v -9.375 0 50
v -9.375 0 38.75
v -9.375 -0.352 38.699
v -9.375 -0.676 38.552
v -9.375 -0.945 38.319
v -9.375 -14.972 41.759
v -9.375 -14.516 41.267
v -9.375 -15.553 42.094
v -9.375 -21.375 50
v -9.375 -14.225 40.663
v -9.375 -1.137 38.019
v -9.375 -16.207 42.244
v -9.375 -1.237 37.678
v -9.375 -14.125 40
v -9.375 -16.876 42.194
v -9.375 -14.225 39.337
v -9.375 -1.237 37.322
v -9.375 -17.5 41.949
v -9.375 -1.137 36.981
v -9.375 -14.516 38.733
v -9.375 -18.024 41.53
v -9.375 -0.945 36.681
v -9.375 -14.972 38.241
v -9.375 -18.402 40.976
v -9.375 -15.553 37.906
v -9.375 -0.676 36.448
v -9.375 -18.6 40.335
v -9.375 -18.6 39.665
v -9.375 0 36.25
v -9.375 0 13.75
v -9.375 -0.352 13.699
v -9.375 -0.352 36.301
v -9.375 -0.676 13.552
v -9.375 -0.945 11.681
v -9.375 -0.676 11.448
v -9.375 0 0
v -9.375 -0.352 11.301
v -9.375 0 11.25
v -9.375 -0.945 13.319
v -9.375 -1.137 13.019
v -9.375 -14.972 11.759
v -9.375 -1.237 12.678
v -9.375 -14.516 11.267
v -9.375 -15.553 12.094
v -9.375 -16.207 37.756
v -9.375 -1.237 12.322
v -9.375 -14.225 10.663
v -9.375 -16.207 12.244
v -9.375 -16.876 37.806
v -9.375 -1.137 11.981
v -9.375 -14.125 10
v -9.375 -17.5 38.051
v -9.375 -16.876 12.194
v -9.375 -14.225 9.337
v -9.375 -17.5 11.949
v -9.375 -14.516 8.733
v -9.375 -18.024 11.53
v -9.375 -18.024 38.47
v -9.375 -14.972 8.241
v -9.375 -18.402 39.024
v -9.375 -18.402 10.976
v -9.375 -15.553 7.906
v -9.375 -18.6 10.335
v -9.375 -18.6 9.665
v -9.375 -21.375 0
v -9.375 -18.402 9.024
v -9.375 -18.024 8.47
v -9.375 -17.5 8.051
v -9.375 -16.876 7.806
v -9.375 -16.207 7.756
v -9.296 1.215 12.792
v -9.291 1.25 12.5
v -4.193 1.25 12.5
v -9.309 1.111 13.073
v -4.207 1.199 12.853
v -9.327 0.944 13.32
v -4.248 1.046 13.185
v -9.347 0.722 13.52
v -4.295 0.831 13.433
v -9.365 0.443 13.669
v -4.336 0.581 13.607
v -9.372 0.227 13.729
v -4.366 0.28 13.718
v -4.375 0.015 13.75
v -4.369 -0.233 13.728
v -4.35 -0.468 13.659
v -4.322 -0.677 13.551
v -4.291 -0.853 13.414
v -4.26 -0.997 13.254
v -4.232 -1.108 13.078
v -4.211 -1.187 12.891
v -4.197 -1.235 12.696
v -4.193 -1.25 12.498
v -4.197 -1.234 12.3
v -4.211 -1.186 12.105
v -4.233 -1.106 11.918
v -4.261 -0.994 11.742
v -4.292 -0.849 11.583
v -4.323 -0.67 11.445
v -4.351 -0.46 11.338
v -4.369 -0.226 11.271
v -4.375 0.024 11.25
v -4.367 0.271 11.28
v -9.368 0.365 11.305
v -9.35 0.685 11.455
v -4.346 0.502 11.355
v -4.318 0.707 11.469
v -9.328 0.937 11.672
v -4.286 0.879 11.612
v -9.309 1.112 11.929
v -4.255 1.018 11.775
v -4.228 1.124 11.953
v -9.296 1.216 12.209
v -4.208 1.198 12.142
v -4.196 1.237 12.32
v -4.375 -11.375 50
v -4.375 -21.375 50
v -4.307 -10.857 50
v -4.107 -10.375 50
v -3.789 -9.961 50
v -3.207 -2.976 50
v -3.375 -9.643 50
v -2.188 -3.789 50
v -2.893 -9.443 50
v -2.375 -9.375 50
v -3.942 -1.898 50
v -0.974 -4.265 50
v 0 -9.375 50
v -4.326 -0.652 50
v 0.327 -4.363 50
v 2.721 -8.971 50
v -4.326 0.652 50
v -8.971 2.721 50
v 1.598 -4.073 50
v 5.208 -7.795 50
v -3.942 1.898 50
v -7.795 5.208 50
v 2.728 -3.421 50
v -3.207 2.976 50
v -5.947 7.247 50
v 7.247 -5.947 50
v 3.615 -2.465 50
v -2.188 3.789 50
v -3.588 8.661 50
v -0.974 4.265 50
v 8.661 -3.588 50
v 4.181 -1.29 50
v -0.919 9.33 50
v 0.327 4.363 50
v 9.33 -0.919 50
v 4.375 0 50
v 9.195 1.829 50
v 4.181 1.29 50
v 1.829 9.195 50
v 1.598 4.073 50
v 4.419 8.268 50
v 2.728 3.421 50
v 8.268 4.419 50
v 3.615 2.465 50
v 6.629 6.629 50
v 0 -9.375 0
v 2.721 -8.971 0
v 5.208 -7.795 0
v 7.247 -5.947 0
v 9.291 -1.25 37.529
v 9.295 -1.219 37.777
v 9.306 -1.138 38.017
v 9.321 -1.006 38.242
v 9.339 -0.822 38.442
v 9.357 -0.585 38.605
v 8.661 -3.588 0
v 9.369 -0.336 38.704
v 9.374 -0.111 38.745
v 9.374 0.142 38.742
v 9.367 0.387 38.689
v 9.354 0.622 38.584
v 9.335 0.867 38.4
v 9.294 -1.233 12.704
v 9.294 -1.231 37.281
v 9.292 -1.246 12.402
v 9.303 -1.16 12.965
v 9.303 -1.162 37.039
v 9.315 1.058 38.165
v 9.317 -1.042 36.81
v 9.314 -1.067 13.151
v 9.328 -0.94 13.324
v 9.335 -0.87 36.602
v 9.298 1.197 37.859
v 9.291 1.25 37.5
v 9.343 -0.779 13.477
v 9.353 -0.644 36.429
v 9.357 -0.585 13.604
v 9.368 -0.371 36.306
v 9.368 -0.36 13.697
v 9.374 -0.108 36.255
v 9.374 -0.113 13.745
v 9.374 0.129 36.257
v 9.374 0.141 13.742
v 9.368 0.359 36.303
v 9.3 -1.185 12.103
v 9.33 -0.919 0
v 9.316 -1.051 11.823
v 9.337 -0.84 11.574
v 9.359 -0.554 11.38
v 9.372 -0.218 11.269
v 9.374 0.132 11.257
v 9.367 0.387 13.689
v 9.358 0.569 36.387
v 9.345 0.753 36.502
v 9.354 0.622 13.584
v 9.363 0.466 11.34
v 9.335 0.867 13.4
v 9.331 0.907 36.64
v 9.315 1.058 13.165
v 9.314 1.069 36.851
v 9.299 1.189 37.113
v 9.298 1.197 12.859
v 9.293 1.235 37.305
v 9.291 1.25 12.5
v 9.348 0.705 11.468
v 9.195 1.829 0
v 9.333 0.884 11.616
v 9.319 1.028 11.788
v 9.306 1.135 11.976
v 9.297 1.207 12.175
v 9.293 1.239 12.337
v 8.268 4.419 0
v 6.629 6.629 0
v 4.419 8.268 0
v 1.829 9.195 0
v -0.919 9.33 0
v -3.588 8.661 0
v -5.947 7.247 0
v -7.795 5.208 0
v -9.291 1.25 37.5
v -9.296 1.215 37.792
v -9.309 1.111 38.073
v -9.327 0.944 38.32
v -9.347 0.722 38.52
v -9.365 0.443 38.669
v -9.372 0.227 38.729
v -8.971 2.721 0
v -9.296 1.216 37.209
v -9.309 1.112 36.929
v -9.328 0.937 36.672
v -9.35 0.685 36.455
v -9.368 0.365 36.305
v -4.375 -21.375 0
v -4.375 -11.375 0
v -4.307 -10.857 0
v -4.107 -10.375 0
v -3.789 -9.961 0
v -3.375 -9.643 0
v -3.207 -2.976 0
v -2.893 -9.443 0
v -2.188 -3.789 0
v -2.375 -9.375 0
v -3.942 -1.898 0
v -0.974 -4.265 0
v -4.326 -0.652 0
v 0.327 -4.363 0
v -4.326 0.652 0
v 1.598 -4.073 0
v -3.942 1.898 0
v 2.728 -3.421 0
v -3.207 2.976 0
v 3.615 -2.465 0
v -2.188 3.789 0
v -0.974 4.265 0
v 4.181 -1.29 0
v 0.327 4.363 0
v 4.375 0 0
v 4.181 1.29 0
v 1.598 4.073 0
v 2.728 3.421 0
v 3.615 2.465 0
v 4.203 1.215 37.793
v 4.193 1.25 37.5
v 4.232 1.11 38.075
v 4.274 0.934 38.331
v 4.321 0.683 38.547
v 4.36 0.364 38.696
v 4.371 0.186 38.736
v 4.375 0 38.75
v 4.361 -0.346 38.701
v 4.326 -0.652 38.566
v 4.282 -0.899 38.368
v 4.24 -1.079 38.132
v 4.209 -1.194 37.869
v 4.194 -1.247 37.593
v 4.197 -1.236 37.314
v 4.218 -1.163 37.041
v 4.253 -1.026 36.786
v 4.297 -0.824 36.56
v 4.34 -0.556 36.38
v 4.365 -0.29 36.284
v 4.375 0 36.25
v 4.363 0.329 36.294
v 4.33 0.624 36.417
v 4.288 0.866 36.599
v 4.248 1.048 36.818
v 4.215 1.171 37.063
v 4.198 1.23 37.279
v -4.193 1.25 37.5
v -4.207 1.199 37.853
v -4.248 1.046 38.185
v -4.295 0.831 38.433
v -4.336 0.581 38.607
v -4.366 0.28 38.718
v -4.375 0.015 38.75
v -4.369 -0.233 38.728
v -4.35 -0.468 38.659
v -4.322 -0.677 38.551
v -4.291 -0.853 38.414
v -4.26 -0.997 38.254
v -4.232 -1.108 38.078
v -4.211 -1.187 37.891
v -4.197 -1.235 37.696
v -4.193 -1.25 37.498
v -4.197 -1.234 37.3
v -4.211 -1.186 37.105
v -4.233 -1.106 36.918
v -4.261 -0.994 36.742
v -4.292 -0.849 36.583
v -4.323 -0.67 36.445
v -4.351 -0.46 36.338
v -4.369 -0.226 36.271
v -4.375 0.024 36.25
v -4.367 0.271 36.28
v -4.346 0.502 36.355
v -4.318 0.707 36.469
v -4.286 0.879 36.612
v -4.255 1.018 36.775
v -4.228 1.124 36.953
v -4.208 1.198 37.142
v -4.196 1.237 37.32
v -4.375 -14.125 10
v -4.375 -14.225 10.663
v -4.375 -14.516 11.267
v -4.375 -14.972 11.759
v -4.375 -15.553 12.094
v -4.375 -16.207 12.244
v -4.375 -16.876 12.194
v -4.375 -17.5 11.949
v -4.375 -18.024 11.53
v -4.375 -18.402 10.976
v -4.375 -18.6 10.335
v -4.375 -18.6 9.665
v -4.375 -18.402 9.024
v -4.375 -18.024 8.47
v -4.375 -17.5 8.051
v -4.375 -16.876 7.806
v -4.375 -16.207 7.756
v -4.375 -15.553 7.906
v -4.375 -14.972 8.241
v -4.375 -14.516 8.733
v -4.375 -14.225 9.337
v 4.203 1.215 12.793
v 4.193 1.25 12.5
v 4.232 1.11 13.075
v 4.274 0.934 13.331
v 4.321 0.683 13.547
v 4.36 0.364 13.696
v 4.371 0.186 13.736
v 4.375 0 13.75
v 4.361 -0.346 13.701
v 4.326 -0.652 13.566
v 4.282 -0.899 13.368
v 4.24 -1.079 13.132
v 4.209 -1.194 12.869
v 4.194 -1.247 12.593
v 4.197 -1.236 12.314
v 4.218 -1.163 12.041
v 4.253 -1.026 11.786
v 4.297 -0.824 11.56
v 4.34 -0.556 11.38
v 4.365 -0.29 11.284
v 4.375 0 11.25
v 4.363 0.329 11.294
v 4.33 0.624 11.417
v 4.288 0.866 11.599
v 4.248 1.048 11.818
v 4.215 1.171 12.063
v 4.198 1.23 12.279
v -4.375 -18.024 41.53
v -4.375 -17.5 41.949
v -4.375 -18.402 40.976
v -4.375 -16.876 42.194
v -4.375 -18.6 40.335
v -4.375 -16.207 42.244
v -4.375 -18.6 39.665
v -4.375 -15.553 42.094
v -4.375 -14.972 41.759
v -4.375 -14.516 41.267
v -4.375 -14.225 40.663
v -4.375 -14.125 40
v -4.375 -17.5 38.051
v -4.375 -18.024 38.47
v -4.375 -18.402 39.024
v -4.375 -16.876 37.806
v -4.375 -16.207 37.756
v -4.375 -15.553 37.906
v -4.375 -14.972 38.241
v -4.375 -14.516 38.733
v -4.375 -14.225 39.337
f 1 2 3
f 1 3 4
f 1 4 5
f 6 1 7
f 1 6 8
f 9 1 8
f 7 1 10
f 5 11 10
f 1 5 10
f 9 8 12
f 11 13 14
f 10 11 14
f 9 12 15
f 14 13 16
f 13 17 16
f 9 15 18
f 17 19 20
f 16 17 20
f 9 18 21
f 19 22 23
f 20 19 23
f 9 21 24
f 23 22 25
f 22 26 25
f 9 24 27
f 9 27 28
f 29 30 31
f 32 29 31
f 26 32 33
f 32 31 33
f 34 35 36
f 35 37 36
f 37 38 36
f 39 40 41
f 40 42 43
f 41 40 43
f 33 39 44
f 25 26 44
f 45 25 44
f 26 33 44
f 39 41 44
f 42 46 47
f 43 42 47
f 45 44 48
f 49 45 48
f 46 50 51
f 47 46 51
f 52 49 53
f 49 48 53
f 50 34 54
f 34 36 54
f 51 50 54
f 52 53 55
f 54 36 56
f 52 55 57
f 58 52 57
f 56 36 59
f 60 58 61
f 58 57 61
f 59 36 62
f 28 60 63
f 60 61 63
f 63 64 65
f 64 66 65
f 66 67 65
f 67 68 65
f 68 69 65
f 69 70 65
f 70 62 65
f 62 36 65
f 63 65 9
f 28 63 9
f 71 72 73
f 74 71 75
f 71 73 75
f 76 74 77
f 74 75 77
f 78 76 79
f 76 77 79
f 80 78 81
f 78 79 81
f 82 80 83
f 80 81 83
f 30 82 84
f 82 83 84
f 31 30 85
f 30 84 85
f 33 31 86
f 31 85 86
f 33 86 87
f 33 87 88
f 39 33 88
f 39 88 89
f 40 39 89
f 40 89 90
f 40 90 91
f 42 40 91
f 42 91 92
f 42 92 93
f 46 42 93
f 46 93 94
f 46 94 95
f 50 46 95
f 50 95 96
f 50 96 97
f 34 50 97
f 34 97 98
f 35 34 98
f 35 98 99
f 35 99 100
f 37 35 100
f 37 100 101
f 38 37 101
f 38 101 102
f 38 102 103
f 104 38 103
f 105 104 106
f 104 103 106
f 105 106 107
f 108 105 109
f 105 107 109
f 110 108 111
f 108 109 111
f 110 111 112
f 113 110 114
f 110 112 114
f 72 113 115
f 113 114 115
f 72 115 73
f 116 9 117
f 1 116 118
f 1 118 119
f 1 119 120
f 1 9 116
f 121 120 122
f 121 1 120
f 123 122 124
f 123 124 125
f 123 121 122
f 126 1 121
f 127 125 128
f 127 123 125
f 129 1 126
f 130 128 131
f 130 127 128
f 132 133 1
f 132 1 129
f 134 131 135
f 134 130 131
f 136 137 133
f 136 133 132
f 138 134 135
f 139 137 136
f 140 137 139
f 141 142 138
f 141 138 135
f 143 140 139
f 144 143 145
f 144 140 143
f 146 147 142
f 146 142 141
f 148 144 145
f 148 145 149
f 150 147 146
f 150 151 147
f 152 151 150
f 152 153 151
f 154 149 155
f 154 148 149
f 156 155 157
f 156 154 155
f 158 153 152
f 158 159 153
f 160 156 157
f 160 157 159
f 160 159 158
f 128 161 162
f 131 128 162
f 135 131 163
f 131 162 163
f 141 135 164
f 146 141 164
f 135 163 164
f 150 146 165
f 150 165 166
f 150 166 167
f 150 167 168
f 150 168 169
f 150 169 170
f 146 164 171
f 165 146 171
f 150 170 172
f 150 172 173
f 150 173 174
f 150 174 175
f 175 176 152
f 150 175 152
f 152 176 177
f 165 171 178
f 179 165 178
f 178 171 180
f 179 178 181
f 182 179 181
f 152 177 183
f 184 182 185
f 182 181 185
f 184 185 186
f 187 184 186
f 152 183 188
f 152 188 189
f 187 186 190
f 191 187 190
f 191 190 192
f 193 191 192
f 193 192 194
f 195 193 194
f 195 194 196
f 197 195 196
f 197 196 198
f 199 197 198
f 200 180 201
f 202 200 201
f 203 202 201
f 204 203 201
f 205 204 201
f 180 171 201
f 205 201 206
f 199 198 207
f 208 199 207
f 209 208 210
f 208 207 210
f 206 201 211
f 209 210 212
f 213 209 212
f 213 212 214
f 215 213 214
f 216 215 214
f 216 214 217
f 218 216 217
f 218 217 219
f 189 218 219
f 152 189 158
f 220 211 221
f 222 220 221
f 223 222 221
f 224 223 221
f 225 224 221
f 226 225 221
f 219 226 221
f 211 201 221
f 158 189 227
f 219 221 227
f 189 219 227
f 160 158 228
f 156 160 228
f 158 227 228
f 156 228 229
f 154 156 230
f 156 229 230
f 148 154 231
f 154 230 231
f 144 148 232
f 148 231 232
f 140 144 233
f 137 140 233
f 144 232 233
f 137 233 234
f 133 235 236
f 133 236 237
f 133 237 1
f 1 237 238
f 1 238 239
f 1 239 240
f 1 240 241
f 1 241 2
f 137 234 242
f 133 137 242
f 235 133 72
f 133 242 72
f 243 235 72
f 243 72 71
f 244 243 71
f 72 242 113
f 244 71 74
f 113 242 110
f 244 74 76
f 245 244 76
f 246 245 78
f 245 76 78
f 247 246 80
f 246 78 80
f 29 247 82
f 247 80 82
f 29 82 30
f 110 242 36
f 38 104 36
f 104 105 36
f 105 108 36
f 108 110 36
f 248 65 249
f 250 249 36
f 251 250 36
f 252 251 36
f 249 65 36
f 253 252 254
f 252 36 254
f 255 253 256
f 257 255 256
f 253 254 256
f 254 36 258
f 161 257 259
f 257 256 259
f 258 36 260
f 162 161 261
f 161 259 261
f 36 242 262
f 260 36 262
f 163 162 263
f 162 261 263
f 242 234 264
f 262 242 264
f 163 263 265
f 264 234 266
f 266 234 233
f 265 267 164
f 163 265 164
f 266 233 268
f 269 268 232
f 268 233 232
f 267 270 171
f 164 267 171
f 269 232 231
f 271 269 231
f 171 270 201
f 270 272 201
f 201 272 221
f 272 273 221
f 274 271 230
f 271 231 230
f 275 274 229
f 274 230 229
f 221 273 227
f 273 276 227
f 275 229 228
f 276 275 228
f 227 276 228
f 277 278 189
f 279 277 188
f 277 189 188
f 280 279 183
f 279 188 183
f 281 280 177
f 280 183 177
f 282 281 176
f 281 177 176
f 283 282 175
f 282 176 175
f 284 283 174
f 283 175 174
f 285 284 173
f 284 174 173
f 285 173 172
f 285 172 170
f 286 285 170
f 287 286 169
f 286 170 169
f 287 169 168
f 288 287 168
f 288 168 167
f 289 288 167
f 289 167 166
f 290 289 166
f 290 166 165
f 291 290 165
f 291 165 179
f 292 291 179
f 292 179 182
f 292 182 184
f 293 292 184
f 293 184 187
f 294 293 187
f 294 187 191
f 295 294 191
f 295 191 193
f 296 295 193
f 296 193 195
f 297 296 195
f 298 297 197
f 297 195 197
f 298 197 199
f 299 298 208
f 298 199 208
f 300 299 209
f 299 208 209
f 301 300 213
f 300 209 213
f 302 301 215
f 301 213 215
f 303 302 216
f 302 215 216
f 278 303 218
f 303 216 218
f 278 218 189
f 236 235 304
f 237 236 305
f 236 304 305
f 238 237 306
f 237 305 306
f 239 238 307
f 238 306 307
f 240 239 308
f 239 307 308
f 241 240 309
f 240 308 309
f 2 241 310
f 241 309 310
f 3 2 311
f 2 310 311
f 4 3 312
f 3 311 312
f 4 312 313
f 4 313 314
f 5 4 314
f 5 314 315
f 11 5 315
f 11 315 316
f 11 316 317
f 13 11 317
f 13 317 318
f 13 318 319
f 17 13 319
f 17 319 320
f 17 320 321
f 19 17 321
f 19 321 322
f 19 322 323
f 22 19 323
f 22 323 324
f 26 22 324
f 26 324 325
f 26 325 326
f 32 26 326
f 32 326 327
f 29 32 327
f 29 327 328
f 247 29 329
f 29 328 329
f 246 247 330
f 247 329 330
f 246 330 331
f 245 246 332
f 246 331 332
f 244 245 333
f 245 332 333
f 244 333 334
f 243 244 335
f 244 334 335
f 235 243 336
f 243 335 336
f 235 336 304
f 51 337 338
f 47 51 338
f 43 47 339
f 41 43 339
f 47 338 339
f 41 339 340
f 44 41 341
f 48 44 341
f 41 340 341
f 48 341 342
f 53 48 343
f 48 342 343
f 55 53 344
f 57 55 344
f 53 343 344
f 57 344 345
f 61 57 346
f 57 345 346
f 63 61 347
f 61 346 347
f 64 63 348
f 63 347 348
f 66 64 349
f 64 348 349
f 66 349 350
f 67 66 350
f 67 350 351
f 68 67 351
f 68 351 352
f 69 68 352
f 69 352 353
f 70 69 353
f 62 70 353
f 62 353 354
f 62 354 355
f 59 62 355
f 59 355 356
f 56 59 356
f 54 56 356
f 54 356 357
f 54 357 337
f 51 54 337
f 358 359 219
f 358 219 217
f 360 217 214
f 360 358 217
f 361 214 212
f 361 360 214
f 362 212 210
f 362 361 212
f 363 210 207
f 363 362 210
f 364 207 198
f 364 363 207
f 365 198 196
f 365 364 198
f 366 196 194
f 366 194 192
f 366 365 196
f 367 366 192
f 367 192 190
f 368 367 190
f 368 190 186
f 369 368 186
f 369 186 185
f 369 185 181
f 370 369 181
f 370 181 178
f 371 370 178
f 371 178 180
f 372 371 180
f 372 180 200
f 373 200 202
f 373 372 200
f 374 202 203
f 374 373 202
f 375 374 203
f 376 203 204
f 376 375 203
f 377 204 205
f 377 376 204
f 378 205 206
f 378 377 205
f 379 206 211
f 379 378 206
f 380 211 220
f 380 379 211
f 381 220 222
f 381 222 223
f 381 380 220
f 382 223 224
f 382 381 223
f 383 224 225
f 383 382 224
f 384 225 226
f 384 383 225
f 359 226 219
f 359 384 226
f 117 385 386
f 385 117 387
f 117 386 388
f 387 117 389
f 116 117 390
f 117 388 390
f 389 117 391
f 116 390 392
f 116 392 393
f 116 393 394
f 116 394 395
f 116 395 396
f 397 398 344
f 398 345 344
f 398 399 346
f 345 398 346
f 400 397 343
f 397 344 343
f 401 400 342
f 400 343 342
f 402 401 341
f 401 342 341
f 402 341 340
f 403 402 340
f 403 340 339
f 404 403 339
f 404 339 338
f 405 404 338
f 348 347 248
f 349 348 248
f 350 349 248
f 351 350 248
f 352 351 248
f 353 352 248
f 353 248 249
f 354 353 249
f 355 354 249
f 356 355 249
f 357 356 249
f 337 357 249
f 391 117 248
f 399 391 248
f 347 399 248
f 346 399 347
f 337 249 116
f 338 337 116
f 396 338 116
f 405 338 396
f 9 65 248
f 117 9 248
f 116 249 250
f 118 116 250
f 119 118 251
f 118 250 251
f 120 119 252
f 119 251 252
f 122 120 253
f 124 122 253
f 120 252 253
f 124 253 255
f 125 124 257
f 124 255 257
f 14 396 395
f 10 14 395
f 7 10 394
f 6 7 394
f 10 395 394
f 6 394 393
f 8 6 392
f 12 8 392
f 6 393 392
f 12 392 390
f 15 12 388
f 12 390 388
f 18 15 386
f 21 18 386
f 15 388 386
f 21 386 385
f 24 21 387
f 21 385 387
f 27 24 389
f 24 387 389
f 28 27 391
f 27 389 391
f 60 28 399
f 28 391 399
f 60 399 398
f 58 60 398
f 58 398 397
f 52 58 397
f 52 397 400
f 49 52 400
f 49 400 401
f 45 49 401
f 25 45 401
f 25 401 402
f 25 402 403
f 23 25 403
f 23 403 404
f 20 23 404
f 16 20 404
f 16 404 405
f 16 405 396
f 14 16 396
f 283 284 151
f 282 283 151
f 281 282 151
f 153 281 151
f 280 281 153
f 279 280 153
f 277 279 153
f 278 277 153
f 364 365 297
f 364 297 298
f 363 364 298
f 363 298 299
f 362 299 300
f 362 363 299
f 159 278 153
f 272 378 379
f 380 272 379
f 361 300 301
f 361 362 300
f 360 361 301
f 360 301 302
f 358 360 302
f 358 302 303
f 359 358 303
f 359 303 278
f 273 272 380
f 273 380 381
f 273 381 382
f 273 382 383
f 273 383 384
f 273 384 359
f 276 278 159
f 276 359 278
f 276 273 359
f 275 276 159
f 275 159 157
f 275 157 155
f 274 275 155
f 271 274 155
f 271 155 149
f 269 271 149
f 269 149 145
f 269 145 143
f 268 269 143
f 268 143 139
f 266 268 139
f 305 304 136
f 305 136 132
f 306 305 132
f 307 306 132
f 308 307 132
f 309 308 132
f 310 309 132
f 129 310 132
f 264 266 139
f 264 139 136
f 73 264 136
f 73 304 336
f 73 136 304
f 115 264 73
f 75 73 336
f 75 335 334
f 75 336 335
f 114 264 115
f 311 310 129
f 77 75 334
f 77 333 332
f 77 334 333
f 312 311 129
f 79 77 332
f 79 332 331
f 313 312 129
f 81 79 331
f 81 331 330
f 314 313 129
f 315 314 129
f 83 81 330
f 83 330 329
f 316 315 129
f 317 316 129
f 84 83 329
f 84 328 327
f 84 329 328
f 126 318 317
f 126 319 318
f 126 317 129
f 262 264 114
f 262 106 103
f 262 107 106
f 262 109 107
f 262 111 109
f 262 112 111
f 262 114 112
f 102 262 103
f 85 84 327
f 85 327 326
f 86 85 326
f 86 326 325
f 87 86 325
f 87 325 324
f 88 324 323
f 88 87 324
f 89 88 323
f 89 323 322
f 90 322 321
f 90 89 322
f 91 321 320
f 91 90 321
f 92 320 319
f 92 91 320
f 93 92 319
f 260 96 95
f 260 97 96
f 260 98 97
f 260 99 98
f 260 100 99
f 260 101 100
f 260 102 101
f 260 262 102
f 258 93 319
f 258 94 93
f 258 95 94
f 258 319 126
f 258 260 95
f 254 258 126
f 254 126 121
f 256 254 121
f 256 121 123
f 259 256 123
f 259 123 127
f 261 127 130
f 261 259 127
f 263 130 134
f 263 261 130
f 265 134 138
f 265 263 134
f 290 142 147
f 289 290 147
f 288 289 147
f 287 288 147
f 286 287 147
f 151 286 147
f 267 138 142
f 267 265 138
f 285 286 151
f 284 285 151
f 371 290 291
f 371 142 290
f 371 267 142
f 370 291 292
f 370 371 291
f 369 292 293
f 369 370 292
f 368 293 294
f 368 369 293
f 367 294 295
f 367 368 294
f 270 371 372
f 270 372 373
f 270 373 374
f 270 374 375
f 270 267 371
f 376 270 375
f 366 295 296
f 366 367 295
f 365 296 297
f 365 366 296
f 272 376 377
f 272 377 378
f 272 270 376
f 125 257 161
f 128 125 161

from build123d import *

# Parameters (mm, degrees)
F0_R     = 4.375
F1_DEPTH = 50
F2_R     = 1.25
F3_DEPTH = 12.5
F4_R     = 2.25
F5_DEPTH = 5.001


with BuildPart() as f1:
    # F0 (on Top) → F1 (new body)
    with BuildSketch(Plane.XY):
        with BuildLine():
            Line((-2.375, -9.375), (0, -9.375))
            ThreePointArc((0, -9.375), (6.629126, 6.629126), (-9.375, 0))
            Line((-9.375, 0), (-9.375, -21.375))
            Line((-9.375, -21.375), (-4.375, -21.375))
            Line((-4.375, -21.375), (-4.375, -11.375))
            ThreePointArc((-4.375, -11.375), (-3.789214, -9.960786), (-2.375, -9.375))
        make_face()
        Circle(F0_R, mode=Mode.SUBTRACT)
    extrude(amount=F1_DEPTH)

    # F2 (on Right) → F3 (cut, symmetric)
    with BuildSketch(Plane.YZ):
        with Locations((0, 12.5)):
            Circle(F2_R)
        with Locations((0, 37.5)):
            Circle(F2_R)
    extrude(amount=F3_DEPTH, both=True, mode=Mode.SUBTRACT)

    # F4 (on face) → F5 (cut, through all)
    with BuildSketch(Plane.YZ.offset(-4.375)):
        with Locations((-16.375, 40)):
            Circle(F4_R)
        with Locations((-16.375, 10)):
            Circle(F4_R)
    extrude(amount=-F5_DEPTH, mode=Mode.SUBTRACT)


solid = f1.part
